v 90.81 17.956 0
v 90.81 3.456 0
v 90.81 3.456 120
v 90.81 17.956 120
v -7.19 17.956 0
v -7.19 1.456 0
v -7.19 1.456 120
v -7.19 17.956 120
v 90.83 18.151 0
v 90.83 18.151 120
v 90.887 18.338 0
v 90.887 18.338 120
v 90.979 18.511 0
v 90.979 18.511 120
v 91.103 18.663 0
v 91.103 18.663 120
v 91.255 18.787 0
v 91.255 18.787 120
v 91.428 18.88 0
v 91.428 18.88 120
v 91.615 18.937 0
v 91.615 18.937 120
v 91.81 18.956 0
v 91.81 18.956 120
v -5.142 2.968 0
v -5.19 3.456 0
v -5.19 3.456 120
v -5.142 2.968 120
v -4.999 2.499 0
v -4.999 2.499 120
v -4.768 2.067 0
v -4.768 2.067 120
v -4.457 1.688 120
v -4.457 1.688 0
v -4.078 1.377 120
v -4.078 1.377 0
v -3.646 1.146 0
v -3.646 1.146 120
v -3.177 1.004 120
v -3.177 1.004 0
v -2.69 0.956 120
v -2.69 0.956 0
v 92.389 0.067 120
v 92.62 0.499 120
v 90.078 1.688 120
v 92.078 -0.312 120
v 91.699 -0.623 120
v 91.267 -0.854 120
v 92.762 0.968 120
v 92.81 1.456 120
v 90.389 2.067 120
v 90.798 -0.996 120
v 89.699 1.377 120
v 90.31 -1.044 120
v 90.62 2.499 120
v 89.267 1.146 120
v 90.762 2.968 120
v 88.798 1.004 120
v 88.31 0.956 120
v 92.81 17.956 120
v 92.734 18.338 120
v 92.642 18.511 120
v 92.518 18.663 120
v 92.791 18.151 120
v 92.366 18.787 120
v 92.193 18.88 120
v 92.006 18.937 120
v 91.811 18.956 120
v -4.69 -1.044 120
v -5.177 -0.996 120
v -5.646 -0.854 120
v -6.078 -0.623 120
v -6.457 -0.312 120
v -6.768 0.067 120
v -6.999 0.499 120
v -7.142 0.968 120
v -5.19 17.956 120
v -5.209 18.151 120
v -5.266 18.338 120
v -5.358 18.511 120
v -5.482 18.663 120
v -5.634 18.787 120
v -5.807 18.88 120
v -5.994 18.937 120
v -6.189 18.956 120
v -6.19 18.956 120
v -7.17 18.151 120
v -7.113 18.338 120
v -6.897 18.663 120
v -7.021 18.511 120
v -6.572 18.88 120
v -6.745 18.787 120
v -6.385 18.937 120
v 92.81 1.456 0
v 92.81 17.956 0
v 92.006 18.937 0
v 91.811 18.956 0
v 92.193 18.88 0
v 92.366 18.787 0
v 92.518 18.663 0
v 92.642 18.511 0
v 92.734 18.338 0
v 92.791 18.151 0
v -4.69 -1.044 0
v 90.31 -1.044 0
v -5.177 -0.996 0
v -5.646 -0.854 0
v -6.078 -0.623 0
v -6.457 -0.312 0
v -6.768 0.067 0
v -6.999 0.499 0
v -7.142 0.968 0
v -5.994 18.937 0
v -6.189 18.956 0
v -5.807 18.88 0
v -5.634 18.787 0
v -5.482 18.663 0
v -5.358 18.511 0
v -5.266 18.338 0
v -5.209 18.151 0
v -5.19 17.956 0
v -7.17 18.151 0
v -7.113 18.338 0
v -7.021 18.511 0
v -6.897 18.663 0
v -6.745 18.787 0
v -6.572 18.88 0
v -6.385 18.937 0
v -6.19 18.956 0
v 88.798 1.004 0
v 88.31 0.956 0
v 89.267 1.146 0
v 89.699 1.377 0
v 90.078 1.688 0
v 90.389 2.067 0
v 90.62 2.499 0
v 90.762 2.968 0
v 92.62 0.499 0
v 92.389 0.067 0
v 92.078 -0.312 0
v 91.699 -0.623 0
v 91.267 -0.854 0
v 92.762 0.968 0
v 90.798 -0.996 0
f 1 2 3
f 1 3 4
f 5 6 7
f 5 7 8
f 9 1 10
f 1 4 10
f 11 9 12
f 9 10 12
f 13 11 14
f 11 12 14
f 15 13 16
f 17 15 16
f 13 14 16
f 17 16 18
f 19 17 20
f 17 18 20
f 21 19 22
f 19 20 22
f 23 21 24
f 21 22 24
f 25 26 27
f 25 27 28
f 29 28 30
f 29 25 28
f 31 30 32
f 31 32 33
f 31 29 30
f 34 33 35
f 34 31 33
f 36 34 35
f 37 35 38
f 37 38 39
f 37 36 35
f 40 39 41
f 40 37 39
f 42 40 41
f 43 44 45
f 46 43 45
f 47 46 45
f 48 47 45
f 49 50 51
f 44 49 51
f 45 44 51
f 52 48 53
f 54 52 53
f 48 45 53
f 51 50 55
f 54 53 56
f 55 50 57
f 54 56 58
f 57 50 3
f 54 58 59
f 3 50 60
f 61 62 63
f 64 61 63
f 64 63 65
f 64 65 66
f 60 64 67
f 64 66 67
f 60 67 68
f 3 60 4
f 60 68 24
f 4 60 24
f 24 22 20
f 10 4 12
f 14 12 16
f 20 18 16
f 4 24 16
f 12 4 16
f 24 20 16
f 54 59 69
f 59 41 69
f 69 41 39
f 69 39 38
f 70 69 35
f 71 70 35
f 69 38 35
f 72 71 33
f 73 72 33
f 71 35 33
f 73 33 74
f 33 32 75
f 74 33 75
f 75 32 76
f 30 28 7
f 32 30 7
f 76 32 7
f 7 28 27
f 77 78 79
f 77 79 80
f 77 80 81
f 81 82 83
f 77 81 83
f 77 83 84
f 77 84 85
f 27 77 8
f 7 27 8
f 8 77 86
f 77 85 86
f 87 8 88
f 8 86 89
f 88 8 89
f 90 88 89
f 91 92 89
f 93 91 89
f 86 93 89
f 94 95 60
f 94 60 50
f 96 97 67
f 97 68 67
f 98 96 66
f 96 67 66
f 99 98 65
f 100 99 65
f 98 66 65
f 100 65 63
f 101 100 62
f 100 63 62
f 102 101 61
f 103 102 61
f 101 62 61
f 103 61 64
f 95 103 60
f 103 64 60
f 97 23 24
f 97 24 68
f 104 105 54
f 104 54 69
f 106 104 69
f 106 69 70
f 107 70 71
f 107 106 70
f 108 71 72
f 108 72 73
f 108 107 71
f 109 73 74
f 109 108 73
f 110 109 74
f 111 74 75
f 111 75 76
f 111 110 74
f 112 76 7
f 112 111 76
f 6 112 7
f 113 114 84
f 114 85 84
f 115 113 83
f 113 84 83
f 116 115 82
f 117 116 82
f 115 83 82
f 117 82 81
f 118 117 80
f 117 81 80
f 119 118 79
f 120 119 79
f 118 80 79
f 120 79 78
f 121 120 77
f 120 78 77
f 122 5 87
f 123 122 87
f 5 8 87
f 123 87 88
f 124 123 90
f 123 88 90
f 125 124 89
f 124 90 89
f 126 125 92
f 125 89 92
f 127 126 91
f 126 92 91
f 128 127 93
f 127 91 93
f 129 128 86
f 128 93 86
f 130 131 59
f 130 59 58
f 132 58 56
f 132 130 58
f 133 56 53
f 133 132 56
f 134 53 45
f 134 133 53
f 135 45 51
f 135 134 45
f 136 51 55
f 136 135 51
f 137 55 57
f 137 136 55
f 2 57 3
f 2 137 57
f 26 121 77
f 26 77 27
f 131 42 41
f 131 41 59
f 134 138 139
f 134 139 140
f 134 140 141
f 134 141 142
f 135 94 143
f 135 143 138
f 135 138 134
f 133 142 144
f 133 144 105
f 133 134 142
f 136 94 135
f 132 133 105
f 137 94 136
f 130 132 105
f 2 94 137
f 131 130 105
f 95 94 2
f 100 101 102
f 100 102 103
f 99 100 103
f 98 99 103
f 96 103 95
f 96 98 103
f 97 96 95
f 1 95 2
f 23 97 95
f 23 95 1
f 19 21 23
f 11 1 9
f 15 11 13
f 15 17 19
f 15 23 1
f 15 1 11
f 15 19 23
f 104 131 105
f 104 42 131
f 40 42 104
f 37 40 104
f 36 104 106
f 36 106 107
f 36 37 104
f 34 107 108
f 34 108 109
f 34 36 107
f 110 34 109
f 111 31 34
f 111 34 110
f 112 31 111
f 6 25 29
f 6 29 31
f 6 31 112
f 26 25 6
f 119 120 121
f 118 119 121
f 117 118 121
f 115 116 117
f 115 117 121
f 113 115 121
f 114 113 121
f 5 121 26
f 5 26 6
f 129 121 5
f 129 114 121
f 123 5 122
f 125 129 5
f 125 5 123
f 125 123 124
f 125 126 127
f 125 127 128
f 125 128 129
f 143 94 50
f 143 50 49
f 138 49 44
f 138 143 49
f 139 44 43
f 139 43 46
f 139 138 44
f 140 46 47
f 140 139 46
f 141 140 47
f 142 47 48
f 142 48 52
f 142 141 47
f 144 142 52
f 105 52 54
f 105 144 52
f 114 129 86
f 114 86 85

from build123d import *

# Parameters (mm, degrees)
BOSS_EXTRUDE3_DEPTH = 120
FILLET4_R           = 1


with BuildPart() as part:
    # Sketch5 → Boss-Extrude3 (new body)
    with BuildSketch(Plane.XY):
        with BuildLine():
            Line((-2.689552127, 0.955752212), (88.310447873, 0.955752212))
            ThreePointArc((88.310447873, 0.955752212), (90.078214826, 1.687985259), (90.810447873, 3.455752212))
            Line((90.810447873, 3.455752212), (90.810447873, 18.955752212))
            Line((90.810447873, 18.955752212), (92.810447873, 18.955752212))
            Line((92.810447873, 18.955752212), (92.810447873, 2.955752212))
            Line((92.810447873, 2.955752212), (92.810447873, 1.455752212))
            ThreePointArc((92.810447873, 1.455752212), (92.078214826, -0.312014741), (90.310447873, -1.044247788))
            Line((90.310447873, -1.044247788), (-4.689552127, -1.044247788))
            ThreePointArc((-4.689552127, -1.044247788), (-6.45731908, -0.312014741), (-7.189552127, 1.455752212))
            Line((-7.189552127, 1.455752212), (-7.189552127, 2.955752212))
            Line((-7.189552127, 2.955752212), (-7.189552127, 18.955752212))
            Line((-7.189552127, 18.955752212), (-5.189552127, 18.955752212))
            Line((-5.189552127, 18.955752212), (-5.189552127, 3.455752212))
            ThreePointArc((-5.189552127, 3.455752212), (-4.45731908, 1.687985259), (-2.689552127, 0.955752212))
        make_face()
    extrude(amount=BOSS_EXTRUDE3_DEPTH)

    # Fillet4
    fillet4_edges = [part.edges().sort_by_distance(p)[0] for p in [
        (92.810447873, 18.955752212, 60),
        (90.810447873, 18.955752212, 60),
        (-7.189552127, 18.955752212, 60),
        (-5.189552127, 18.955752212, 60),
    ]]
    fillet(fillet4_edges, radius=FILLET4_R - 0.0001)  # a hair under: the kernel refuses the full size


solid = part.part
